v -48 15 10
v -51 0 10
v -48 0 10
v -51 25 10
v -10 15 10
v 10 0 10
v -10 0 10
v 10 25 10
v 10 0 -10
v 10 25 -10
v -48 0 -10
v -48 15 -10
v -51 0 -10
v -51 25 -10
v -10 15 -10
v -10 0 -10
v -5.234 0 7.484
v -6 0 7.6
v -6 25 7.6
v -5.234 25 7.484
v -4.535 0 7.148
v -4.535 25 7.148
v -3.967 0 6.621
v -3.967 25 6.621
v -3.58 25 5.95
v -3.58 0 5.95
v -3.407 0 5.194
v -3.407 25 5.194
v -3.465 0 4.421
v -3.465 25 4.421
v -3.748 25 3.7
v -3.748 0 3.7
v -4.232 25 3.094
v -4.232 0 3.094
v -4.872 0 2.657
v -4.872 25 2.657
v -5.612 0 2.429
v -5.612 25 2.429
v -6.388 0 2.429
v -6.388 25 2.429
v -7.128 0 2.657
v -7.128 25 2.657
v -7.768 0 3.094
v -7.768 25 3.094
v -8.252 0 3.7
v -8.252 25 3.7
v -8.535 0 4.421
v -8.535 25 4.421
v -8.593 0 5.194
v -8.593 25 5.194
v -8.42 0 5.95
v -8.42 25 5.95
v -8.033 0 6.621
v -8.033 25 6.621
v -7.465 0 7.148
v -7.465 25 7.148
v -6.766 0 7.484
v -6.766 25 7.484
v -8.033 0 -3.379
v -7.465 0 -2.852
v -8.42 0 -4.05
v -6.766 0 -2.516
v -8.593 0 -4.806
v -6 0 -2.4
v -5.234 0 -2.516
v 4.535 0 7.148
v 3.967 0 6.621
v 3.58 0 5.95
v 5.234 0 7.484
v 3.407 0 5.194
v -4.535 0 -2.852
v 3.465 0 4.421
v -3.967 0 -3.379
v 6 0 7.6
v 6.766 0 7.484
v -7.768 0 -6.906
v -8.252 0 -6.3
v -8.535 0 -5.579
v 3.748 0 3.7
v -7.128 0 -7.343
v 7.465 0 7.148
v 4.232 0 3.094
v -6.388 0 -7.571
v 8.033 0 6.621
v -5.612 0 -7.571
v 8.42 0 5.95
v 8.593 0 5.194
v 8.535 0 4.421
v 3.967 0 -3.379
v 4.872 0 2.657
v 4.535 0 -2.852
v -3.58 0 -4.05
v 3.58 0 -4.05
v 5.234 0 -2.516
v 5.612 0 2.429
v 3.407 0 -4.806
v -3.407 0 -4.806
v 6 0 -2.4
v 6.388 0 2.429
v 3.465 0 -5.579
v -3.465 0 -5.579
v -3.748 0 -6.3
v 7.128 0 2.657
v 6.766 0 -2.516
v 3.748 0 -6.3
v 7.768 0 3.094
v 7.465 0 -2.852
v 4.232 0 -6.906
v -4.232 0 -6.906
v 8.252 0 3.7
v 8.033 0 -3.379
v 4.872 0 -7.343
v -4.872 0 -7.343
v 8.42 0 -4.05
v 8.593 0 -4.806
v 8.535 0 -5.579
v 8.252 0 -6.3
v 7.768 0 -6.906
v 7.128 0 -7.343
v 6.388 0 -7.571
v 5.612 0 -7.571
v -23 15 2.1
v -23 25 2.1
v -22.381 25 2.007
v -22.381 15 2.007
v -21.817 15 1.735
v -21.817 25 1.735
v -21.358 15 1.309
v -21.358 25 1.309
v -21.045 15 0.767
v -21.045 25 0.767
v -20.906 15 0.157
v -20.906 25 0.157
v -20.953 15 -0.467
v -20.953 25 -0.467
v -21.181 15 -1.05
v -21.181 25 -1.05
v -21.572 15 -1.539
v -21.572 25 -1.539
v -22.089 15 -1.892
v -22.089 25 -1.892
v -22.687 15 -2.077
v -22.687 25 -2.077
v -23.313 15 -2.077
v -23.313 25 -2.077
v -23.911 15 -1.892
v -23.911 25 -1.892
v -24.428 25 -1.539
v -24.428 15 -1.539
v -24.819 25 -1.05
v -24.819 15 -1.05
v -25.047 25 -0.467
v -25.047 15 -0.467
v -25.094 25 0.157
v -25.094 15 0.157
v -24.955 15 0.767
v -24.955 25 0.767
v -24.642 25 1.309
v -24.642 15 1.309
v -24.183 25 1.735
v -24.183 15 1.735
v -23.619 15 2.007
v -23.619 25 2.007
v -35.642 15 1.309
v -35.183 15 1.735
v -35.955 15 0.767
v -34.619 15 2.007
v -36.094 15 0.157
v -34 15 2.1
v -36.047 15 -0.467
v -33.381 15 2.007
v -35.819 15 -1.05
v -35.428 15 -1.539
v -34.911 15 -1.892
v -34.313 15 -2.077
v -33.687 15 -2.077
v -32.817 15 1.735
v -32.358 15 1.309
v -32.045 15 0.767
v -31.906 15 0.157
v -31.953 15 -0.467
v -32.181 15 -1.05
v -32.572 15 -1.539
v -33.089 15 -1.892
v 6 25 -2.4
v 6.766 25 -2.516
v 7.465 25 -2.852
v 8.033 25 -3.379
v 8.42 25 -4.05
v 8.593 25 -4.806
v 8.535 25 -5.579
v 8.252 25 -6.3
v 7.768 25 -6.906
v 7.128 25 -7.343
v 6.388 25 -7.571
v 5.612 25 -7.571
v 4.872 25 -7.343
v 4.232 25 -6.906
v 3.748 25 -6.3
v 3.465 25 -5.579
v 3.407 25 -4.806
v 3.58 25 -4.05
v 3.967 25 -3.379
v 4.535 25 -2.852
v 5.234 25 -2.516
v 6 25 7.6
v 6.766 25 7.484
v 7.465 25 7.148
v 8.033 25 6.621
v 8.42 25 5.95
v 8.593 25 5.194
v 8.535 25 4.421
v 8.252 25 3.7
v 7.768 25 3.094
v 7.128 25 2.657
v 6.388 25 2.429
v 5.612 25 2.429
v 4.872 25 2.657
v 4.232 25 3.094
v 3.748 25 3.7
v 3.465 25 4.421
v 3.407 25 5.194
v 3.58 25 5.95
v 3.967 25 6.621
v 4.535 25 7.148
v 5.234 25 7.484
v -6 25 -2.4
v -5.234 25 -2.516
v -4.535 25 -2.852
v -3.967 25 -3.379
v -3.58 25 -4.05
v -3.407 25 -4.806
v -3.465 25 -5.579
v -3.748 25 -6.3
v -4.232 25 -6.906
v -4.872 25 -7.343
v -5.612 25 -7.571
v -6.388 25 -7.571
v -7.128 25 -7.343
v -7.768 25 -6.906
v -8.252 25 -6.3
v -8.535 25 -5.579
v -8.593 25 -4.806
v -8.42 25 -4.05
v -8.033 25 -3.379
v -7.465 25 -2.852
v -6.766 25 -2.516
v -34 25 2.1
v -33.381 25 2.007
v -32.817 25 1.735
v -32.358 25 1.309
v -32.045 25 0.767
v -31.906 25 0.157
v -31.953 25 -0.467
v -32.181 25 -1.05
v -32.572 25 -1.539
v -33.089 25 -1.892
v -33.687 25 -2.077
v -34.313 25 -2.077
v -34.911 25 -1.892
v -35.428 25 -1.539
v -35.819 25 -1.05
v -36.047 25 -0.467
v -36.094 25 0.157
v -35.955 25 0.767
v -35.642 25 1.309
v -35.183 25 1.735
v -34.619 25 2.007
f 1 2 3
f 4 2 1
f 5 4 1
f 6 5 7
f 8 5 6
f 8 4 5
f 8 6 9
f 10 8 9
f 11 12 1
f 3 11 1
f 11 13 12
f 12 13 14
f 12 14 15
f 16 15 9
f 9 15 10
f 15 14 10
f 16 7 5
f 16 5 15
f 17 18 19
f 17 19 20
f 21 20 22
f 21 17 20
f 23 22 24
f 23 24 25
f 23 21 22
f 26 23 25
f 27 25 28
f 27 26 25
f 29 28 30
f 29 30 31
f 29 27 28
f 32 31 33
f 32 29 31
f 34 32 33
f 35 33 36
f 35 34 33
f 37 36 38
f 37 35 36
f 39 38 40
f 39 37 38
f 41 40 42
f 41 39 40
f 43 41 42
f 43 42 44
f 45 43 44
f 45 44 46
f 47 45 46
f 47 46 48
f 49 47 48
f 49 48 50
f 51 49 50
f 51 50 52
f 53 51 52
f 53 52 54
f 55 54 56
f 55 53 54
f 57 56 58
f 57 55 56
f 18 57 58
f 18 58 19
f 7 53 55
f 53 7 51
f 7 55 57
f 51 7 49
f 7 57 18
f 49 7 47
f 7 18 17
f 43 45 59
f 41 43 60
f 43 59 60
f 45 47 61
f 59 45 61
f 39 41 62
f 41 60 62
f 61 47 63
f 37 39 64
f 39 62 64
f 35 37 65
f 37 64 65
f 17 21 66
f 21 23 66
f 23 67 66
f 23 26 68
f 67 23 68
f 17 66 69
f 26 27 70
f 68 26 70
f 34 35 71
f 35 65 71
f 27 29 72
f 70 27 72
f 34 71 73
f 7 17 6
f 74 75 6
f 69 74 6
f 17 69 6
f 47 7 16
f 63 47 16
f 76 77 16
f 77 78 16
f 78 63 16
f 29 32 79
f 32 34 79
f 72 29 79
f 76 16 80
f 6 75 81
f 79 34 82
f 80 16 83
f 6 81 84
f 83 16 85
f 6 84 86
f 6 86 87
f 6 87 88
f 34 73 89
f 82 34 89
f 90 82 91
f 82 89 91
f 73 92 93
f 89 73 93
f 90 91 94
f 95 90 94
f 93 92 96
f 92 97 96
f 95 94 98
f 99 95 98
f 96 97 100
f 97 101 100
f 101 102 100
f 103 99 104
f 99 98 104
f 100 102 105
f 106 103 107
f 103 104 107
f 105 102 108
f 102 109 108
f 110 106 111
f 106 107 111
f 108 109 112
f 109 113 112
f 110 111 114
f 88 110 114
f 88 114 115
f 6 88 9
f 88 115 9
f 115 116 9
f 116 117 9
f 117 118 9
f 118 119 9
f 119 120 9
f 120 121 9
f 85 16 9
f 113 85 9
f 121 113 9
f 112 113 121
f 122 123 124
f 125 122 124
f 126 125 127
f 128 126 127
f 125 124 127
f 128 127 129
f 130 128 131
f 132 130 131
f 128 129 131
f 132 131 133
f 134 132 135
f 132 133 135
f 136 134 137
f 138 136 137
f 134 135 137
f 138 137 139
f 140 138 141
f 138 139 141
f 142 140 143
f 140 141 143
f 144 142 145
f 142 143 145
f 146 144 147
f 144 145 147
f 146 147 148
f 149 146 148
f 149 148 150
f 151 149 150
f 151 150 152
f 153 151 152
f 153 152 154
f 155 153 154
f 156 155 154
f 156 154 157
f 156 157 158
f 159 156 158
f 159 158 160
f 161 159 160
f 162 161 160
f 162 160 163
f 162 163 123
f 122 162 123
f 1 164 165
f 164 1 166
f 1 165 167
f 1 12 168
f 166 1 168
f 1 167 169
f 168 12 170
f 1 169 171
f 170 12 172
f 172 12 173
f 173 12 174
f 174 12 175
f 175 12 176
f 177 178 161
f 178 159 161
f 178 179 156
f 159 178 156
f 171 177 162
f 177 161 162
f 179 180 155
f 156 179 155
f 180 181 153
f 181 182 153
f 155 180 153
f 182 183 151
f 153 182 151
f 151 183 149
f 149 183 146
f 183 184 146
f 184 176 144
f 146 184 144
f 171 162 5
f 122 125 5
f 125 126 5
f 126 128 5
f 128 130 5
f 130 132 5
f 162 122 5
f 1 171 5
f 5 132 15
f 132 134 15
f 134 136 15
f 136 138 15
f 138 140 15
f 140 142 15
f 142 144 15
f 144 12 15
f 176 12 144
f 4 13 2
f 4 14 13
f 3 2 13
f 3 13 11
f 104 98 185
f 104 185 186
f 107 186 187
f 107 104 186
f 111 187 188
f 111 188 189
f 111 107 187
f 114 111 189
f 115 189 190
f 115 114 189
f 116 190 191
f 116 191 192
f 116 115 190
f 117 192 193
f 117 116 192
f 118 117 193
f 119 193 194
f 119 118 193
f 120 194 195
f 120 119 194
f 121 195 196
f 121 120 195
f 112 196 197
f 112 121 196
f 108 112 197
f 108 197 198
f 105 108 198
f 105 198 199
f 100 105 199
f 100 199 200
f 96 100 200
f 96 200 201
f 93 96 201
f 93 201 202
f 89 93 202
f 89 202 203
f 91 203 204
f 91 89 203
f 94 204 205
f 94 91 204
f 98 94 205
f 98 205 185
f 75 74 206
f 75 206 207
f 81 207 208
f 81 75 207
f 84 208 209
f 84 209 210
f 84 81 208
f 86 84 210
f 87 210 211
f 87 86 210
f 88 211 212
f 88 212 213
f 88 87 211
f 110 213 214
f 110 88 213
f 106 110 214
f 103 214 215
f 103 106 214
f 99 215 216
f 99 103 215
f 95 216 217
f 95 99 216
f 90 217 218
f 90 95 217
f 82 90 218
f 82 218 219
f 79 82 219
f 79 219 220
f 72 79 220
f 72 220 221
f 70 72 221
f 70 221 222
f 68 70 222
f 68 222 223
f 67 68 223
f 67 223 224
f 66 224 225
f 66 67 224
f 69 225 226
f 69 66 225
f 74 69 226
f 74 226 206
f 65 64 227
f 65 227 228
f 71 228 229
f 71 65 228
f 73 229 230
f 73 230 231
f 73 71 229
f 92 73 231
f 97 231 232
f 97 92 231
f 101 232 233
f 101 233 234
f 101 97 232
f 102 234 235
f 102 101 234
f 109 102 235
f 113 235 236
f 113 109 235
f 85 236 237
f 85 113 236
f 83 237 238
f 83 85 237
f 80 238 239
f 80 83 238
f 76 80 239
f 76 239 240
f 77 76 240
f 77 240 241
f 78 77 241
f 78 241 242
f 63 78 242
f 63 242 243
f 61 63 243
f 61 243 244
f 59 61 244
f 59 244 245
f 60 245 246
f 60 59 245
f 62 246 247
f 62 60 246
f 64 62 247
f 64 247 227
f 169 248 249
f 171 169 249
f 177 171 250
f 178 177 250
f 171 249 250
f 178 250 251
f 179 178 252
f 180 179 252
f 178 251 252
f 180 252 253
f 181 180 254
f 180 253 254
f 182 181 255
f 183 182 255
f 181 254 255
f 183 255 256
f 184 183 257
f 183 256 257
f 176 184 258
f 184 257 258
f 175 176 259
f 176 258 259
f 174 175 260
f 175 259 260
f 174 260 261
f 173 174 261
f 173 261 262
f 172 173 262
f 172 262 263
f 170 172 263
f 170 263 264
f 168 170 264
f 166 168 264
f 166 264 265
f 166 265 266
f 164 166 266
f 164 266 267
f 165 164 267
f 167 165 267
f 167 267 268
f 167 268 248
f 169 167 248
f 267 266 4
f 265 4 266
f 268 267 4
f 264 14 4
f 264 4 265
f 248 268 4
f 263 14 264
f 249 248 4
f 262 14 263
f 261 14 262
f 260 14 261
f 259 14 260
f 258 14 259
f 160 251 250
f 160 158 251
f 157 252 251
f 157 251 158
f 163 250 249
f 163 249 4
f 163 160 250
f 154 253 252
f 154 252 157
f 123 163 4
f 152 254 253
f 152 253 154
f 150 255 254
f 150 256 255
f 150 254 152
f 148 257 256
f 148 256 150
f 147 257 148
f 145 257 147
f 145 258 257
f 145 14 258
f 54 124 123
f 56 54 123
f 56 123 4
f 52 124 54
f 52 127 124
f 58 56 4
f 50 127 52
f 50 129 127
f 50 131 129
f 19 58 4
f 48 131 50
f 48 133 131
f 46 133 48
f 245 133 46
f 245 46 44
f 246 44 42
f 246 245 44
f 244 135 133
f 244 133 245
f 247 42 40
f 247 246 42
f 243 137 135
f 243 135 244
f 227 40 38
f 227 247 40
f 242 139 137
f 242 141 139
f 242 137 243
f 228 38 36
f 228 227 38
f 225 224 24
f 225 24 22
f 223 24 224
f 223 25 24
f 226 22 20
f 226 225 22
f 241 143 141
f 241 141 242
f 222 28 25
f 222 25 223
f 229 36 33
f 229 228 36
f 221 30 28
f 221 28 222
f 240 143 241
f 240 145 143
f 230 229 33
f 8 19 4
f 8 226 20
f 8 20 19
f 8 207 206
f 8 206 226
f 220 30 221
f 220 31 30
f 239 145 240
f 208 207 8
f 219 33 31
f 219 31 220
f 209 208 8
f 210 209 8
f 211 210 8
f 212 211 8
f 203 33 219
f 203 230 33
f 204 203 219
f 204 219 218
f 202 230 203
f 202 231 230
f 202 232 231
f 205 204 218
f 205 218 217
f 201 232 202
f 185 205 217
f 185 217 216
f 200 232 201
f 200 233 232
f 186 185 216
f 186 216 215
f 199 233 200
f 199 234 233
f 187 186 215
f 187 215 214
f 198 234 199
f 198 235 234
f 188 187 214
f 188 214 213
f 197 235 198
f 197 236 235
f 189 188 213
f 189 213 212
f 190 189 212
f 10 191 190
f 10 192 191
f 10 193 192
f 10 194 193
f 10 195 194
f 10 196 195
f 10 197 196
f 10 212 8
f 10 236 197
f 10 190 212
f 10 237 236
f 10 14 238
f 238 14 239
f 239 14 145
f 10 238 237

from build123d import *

# Parameters (mm, degrees)
SKETCH_1_W          = 20
SKETCH_1_H          = 20
SKETCH_1_R          = 2.6
EXTRUDE_1_DEPTH     = 25
SKETCH_2_W          = 41
SKETCH_2_H          = 20
EXTRUDE_2_DEPTH     = 10
SKETCH_3_W          = 3
SKETCH_3_H          = 20
EXTRUDE_3_DEPTH     = 15
SKETCH_4_R          = 2.1
CUT_EXTRUDE_1_DEPTH = 58.671483421


with BuildPart() as part:
    # 草图1 → 凸台-拉伸1 (new body)
    with BuildSketch(Plane(origin=(0, 0, 0), x_dir=(1, 0, 0), z_dir=(0, 1, 0))):
        Rectangle(SKETCH_1_W, SKETCH_1_H)
        with Locations(Location((-6, 5, 0), (0, 0, 270))):
            Circle(SKETCH_1_R, mode=Mode.SUBTRACT)
        with Locations(Location((6, 5, 0), (0, 0, 270))):
            Circle(SKETCH_1_R, mode=Mode.SUBTRACT)
        with Locations(Location((-6, -5, 0), (0, 0, 270))):
            Circle(SKETCH_1_R, mode=Mode.SUBTRACT)
        with Locations(Location((6, -5, 0), (0, 0, 270))):
            Circle(SKETCH_1_R, mode=Mode.SUBTRACT)
    extrude(amount=EXTRUDE_1_DEPTH)

    # 草图2 → 凸台-拉伸2 (add)
    with BuildSketch(Plane(origin=(0, 25, 0), x_dir=(1, 0, 0), z_dir=(0, 1, 0))):
        with Locations((-30.5, 0)):
            Rectangle(SKETCH_2_W, SKETCH_2_H)
    extrude(amount=-EXTRUDE_2_DEPTH)

    # 草图3 → 凸台-拉伸3 (add)
    with BuildSketch(Plane.XZ.offset(-15)):
        with Locations((-49.5, 0)):
            Rectangle(SKETCH_3_W, SKETCH_3_H)
    extrude(amount=EXTRUDE_3_DEPTH)

    # 草图4 → 切除-拉伸1 (cut, through all)
    with BuildSketch(Plane(origin=(0, 25, 0), x_dir=(1, 0, 0), z_dir=(0, 1, 0))):
        with Locations(Location((-34, 0, 0), (0, 0, 270))):
            Circle(SKETCH_4_R)
        with Locations(Location((-23, 0, 0), (0, 0, 270))):
            Circle(SKETCH_4_R)
    extrude(amount=-CUT_EXTRUDE_1_DEPTH, mode=Mode.SUBTRACT)


solid = part.part
